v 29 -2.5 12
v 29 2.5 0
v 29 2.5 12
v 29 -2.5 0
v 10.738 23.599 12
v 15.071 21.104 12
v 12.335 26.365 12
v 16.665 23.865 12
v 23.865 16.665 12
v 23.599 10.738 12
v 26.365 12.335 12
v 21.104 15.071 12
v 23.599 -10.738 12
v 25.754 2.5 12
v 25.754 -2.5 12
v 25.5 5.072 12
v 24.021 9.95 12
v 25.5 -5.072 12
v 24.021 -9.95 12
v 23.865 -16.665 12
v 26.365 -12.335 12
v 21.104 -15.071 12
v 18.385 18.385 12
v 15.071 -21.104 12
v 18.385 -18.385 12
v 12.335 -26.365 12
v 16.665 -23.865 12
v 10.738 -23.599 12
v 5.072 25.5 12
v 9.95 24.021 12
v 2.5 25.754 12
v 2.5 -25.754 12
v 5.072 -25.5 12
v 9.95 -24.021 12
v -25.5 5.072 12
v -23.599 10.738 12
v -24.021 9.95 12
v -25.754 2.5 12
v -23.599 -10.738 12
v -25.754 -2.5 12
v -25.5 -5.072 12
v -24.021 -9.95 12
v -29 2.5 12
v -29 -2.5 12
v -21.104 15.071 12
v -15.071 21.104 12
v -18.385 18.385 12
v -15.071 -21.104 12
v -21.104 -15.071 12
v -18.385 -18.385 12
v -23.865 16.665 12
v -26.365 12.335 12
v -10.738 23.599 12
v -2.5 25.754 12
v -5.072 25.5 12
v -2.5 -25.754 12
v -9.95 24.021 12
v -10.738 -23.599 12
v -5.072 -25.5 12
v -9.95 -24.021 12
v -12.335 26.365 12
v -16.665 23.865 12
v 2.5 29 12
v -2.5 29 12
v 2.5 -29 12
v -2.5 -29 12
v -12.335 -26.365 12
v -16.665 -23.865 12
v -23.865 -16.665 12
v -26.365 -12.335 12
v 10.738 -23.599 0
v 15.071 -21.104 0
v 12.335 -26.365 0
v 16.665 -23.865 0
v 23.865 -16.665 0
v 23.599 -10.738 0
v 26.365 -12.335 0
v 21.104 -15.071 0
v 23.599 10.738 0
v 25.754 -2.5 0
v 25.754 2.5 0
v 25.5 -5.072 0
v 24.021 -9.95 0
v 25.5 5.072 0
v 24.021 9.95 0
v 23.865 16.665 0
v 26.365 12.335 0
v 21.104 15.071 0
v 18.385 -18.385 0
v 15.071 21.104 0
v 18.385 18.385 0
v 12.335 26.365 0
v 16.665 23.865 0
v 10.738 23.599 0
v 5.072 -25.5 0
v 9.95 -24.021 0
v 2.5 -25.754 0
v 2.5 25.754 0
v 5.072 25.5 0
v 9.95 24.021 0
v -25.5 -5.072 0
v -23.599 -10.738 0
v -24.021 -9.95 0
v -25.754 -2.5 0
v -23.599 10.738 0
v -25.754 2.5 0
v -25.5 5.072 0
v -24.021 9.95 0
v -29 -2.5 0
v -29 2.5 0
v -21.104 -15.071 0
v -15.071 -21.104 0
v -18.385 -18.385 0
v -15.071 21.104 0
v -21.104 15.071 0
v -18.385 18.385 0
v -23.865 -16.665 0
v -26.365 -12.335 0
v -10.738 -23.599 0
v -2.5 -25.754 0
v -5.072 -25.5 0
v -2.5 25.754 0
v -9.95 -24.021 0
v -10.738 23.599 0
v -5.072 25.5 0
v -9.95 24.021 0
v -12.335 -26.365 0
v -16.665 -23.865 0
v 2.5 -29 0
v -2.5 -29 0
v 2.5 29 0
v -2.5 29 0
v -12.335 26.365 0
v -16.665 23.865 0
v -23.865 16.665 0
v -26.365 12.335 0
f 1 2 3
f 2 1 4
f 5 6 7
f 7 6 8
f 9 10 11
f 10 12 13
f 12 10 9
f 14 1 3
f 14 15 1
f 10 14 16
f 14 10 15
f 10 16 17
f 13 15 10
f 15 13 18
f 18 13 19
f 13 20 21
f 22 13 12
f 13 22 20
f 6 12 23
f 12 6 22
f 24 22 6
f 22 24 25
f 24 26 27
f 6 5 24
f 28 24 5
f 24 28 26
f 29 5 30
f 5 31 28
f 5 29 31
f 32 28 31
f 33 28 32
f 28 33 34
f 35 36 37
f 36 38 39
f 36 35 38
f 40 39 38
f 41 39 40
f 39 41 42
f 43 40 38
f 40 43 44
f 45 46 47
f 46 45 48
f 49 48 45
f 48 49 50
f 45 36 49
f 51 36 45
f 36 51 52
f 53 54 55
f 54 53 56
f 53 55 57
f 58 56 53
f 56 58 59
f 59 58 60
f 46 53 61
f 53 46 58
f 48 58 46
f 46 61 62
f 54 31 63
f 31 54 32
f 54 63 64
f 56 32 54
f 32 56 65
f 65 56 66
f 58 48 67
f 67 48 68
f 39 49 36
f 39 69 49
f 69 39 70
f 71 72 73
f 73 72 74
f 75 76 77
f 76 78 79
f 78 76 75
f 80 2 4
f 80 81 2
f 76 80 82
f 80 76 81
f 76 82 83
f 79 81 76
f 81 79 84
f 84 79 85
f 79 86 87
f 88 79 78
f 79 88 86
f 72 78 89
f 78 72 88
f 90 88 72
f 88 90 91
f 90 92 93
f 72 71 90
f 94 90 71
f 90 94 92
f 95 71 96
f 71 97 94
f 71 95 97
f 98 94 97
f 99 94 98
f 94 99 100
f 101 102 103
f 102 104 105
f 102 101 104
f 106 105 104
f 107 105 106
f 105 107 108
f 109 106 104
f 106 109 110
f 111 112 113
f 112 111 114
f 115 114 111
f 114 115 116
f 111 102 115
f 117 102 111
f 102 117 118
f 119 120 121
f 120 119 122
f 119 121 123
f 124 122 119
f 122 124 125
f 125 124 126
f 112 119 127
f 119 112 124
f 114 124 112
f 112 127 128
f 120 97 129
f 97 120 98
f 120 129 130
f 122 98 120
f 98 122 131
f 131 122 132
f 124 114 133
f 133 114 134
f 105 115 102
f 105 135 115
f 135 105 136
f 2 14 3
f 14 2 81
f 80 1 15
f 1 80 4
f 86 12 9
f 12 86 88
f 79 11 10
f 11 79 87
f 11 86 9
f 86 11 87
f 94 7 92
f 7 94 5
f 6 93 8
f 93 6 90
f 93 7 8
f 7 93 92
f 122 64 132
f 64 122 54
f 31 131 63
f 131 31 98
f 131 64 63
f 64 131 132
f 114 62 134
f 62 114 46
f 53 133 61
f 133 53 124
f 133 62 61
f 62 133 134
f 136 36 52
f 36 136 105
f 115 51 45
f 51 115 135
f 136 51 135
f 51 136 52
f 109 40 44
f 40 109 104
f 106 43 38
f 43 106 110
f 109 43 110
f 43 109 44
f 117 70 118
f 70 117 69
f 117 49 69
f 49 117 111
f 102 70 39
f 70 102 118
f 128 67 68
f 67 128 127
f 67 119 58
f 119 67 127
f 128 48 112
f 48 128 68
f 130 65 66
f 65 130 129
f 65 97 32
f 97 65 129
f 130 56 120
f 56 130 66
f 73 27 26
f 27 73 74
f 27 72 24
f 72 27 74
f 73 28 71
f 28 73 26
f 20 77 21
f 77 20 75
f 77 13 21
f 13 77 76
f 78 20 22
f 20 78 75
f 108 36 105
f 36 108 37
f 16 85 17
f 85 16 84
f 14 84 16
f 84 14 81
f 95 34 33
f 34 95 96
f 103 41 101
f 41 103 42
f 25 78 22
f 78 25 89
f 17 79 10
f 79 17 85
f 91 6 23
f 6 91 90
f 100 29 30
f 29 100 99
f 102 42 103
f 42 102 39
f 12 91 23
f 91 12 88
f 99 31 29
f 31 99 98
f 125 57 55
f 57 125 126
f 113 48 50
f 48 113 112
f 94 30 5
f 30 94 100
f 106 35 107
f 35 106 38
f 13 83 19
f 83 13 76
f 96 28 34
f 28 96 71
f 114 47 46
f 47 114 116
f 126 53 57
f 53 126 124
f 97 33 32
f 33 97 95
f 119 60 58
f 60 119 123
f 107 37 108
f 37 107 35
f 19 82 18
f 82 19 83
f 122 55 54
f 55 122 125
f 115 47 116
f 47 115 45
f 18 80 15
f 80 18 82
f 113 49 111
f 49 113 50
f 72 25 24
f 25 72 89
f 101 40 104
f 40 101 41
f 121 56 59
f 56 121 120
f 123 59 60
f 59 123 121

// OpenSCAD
$fn = 32;

// ----------------------------------------------------------------------
// Spur blank: plain gear blank
// ----------------------------------------------------------------------

// --- parameters (mm) ---
disc_r = 26;              // blank root radius
disc_t = 12;              // blank thickness
n_teeth = 12;             // stub tooth count
tooth_w = 5;              // tooth width at the root
tooth_h = 3;              // tooth height above the root

out_r = disc_r + tooth_h;  // tip radius
bbox_x = 58.0;  // measured width over the teeth
bbox_y = 58.0;  // measured depth over the teeth

union() {
  cylinder(r = disc_r, h = disc_t);
  for (i = [0 : n_teeth - 1])
    rotate([0, 0, i * 360 / n_teeth])
      translate([disc_r - 1, -tooth_w / 2, 0])
        cube([tooth_h + 1, tooth_w, disc_t]);
}
